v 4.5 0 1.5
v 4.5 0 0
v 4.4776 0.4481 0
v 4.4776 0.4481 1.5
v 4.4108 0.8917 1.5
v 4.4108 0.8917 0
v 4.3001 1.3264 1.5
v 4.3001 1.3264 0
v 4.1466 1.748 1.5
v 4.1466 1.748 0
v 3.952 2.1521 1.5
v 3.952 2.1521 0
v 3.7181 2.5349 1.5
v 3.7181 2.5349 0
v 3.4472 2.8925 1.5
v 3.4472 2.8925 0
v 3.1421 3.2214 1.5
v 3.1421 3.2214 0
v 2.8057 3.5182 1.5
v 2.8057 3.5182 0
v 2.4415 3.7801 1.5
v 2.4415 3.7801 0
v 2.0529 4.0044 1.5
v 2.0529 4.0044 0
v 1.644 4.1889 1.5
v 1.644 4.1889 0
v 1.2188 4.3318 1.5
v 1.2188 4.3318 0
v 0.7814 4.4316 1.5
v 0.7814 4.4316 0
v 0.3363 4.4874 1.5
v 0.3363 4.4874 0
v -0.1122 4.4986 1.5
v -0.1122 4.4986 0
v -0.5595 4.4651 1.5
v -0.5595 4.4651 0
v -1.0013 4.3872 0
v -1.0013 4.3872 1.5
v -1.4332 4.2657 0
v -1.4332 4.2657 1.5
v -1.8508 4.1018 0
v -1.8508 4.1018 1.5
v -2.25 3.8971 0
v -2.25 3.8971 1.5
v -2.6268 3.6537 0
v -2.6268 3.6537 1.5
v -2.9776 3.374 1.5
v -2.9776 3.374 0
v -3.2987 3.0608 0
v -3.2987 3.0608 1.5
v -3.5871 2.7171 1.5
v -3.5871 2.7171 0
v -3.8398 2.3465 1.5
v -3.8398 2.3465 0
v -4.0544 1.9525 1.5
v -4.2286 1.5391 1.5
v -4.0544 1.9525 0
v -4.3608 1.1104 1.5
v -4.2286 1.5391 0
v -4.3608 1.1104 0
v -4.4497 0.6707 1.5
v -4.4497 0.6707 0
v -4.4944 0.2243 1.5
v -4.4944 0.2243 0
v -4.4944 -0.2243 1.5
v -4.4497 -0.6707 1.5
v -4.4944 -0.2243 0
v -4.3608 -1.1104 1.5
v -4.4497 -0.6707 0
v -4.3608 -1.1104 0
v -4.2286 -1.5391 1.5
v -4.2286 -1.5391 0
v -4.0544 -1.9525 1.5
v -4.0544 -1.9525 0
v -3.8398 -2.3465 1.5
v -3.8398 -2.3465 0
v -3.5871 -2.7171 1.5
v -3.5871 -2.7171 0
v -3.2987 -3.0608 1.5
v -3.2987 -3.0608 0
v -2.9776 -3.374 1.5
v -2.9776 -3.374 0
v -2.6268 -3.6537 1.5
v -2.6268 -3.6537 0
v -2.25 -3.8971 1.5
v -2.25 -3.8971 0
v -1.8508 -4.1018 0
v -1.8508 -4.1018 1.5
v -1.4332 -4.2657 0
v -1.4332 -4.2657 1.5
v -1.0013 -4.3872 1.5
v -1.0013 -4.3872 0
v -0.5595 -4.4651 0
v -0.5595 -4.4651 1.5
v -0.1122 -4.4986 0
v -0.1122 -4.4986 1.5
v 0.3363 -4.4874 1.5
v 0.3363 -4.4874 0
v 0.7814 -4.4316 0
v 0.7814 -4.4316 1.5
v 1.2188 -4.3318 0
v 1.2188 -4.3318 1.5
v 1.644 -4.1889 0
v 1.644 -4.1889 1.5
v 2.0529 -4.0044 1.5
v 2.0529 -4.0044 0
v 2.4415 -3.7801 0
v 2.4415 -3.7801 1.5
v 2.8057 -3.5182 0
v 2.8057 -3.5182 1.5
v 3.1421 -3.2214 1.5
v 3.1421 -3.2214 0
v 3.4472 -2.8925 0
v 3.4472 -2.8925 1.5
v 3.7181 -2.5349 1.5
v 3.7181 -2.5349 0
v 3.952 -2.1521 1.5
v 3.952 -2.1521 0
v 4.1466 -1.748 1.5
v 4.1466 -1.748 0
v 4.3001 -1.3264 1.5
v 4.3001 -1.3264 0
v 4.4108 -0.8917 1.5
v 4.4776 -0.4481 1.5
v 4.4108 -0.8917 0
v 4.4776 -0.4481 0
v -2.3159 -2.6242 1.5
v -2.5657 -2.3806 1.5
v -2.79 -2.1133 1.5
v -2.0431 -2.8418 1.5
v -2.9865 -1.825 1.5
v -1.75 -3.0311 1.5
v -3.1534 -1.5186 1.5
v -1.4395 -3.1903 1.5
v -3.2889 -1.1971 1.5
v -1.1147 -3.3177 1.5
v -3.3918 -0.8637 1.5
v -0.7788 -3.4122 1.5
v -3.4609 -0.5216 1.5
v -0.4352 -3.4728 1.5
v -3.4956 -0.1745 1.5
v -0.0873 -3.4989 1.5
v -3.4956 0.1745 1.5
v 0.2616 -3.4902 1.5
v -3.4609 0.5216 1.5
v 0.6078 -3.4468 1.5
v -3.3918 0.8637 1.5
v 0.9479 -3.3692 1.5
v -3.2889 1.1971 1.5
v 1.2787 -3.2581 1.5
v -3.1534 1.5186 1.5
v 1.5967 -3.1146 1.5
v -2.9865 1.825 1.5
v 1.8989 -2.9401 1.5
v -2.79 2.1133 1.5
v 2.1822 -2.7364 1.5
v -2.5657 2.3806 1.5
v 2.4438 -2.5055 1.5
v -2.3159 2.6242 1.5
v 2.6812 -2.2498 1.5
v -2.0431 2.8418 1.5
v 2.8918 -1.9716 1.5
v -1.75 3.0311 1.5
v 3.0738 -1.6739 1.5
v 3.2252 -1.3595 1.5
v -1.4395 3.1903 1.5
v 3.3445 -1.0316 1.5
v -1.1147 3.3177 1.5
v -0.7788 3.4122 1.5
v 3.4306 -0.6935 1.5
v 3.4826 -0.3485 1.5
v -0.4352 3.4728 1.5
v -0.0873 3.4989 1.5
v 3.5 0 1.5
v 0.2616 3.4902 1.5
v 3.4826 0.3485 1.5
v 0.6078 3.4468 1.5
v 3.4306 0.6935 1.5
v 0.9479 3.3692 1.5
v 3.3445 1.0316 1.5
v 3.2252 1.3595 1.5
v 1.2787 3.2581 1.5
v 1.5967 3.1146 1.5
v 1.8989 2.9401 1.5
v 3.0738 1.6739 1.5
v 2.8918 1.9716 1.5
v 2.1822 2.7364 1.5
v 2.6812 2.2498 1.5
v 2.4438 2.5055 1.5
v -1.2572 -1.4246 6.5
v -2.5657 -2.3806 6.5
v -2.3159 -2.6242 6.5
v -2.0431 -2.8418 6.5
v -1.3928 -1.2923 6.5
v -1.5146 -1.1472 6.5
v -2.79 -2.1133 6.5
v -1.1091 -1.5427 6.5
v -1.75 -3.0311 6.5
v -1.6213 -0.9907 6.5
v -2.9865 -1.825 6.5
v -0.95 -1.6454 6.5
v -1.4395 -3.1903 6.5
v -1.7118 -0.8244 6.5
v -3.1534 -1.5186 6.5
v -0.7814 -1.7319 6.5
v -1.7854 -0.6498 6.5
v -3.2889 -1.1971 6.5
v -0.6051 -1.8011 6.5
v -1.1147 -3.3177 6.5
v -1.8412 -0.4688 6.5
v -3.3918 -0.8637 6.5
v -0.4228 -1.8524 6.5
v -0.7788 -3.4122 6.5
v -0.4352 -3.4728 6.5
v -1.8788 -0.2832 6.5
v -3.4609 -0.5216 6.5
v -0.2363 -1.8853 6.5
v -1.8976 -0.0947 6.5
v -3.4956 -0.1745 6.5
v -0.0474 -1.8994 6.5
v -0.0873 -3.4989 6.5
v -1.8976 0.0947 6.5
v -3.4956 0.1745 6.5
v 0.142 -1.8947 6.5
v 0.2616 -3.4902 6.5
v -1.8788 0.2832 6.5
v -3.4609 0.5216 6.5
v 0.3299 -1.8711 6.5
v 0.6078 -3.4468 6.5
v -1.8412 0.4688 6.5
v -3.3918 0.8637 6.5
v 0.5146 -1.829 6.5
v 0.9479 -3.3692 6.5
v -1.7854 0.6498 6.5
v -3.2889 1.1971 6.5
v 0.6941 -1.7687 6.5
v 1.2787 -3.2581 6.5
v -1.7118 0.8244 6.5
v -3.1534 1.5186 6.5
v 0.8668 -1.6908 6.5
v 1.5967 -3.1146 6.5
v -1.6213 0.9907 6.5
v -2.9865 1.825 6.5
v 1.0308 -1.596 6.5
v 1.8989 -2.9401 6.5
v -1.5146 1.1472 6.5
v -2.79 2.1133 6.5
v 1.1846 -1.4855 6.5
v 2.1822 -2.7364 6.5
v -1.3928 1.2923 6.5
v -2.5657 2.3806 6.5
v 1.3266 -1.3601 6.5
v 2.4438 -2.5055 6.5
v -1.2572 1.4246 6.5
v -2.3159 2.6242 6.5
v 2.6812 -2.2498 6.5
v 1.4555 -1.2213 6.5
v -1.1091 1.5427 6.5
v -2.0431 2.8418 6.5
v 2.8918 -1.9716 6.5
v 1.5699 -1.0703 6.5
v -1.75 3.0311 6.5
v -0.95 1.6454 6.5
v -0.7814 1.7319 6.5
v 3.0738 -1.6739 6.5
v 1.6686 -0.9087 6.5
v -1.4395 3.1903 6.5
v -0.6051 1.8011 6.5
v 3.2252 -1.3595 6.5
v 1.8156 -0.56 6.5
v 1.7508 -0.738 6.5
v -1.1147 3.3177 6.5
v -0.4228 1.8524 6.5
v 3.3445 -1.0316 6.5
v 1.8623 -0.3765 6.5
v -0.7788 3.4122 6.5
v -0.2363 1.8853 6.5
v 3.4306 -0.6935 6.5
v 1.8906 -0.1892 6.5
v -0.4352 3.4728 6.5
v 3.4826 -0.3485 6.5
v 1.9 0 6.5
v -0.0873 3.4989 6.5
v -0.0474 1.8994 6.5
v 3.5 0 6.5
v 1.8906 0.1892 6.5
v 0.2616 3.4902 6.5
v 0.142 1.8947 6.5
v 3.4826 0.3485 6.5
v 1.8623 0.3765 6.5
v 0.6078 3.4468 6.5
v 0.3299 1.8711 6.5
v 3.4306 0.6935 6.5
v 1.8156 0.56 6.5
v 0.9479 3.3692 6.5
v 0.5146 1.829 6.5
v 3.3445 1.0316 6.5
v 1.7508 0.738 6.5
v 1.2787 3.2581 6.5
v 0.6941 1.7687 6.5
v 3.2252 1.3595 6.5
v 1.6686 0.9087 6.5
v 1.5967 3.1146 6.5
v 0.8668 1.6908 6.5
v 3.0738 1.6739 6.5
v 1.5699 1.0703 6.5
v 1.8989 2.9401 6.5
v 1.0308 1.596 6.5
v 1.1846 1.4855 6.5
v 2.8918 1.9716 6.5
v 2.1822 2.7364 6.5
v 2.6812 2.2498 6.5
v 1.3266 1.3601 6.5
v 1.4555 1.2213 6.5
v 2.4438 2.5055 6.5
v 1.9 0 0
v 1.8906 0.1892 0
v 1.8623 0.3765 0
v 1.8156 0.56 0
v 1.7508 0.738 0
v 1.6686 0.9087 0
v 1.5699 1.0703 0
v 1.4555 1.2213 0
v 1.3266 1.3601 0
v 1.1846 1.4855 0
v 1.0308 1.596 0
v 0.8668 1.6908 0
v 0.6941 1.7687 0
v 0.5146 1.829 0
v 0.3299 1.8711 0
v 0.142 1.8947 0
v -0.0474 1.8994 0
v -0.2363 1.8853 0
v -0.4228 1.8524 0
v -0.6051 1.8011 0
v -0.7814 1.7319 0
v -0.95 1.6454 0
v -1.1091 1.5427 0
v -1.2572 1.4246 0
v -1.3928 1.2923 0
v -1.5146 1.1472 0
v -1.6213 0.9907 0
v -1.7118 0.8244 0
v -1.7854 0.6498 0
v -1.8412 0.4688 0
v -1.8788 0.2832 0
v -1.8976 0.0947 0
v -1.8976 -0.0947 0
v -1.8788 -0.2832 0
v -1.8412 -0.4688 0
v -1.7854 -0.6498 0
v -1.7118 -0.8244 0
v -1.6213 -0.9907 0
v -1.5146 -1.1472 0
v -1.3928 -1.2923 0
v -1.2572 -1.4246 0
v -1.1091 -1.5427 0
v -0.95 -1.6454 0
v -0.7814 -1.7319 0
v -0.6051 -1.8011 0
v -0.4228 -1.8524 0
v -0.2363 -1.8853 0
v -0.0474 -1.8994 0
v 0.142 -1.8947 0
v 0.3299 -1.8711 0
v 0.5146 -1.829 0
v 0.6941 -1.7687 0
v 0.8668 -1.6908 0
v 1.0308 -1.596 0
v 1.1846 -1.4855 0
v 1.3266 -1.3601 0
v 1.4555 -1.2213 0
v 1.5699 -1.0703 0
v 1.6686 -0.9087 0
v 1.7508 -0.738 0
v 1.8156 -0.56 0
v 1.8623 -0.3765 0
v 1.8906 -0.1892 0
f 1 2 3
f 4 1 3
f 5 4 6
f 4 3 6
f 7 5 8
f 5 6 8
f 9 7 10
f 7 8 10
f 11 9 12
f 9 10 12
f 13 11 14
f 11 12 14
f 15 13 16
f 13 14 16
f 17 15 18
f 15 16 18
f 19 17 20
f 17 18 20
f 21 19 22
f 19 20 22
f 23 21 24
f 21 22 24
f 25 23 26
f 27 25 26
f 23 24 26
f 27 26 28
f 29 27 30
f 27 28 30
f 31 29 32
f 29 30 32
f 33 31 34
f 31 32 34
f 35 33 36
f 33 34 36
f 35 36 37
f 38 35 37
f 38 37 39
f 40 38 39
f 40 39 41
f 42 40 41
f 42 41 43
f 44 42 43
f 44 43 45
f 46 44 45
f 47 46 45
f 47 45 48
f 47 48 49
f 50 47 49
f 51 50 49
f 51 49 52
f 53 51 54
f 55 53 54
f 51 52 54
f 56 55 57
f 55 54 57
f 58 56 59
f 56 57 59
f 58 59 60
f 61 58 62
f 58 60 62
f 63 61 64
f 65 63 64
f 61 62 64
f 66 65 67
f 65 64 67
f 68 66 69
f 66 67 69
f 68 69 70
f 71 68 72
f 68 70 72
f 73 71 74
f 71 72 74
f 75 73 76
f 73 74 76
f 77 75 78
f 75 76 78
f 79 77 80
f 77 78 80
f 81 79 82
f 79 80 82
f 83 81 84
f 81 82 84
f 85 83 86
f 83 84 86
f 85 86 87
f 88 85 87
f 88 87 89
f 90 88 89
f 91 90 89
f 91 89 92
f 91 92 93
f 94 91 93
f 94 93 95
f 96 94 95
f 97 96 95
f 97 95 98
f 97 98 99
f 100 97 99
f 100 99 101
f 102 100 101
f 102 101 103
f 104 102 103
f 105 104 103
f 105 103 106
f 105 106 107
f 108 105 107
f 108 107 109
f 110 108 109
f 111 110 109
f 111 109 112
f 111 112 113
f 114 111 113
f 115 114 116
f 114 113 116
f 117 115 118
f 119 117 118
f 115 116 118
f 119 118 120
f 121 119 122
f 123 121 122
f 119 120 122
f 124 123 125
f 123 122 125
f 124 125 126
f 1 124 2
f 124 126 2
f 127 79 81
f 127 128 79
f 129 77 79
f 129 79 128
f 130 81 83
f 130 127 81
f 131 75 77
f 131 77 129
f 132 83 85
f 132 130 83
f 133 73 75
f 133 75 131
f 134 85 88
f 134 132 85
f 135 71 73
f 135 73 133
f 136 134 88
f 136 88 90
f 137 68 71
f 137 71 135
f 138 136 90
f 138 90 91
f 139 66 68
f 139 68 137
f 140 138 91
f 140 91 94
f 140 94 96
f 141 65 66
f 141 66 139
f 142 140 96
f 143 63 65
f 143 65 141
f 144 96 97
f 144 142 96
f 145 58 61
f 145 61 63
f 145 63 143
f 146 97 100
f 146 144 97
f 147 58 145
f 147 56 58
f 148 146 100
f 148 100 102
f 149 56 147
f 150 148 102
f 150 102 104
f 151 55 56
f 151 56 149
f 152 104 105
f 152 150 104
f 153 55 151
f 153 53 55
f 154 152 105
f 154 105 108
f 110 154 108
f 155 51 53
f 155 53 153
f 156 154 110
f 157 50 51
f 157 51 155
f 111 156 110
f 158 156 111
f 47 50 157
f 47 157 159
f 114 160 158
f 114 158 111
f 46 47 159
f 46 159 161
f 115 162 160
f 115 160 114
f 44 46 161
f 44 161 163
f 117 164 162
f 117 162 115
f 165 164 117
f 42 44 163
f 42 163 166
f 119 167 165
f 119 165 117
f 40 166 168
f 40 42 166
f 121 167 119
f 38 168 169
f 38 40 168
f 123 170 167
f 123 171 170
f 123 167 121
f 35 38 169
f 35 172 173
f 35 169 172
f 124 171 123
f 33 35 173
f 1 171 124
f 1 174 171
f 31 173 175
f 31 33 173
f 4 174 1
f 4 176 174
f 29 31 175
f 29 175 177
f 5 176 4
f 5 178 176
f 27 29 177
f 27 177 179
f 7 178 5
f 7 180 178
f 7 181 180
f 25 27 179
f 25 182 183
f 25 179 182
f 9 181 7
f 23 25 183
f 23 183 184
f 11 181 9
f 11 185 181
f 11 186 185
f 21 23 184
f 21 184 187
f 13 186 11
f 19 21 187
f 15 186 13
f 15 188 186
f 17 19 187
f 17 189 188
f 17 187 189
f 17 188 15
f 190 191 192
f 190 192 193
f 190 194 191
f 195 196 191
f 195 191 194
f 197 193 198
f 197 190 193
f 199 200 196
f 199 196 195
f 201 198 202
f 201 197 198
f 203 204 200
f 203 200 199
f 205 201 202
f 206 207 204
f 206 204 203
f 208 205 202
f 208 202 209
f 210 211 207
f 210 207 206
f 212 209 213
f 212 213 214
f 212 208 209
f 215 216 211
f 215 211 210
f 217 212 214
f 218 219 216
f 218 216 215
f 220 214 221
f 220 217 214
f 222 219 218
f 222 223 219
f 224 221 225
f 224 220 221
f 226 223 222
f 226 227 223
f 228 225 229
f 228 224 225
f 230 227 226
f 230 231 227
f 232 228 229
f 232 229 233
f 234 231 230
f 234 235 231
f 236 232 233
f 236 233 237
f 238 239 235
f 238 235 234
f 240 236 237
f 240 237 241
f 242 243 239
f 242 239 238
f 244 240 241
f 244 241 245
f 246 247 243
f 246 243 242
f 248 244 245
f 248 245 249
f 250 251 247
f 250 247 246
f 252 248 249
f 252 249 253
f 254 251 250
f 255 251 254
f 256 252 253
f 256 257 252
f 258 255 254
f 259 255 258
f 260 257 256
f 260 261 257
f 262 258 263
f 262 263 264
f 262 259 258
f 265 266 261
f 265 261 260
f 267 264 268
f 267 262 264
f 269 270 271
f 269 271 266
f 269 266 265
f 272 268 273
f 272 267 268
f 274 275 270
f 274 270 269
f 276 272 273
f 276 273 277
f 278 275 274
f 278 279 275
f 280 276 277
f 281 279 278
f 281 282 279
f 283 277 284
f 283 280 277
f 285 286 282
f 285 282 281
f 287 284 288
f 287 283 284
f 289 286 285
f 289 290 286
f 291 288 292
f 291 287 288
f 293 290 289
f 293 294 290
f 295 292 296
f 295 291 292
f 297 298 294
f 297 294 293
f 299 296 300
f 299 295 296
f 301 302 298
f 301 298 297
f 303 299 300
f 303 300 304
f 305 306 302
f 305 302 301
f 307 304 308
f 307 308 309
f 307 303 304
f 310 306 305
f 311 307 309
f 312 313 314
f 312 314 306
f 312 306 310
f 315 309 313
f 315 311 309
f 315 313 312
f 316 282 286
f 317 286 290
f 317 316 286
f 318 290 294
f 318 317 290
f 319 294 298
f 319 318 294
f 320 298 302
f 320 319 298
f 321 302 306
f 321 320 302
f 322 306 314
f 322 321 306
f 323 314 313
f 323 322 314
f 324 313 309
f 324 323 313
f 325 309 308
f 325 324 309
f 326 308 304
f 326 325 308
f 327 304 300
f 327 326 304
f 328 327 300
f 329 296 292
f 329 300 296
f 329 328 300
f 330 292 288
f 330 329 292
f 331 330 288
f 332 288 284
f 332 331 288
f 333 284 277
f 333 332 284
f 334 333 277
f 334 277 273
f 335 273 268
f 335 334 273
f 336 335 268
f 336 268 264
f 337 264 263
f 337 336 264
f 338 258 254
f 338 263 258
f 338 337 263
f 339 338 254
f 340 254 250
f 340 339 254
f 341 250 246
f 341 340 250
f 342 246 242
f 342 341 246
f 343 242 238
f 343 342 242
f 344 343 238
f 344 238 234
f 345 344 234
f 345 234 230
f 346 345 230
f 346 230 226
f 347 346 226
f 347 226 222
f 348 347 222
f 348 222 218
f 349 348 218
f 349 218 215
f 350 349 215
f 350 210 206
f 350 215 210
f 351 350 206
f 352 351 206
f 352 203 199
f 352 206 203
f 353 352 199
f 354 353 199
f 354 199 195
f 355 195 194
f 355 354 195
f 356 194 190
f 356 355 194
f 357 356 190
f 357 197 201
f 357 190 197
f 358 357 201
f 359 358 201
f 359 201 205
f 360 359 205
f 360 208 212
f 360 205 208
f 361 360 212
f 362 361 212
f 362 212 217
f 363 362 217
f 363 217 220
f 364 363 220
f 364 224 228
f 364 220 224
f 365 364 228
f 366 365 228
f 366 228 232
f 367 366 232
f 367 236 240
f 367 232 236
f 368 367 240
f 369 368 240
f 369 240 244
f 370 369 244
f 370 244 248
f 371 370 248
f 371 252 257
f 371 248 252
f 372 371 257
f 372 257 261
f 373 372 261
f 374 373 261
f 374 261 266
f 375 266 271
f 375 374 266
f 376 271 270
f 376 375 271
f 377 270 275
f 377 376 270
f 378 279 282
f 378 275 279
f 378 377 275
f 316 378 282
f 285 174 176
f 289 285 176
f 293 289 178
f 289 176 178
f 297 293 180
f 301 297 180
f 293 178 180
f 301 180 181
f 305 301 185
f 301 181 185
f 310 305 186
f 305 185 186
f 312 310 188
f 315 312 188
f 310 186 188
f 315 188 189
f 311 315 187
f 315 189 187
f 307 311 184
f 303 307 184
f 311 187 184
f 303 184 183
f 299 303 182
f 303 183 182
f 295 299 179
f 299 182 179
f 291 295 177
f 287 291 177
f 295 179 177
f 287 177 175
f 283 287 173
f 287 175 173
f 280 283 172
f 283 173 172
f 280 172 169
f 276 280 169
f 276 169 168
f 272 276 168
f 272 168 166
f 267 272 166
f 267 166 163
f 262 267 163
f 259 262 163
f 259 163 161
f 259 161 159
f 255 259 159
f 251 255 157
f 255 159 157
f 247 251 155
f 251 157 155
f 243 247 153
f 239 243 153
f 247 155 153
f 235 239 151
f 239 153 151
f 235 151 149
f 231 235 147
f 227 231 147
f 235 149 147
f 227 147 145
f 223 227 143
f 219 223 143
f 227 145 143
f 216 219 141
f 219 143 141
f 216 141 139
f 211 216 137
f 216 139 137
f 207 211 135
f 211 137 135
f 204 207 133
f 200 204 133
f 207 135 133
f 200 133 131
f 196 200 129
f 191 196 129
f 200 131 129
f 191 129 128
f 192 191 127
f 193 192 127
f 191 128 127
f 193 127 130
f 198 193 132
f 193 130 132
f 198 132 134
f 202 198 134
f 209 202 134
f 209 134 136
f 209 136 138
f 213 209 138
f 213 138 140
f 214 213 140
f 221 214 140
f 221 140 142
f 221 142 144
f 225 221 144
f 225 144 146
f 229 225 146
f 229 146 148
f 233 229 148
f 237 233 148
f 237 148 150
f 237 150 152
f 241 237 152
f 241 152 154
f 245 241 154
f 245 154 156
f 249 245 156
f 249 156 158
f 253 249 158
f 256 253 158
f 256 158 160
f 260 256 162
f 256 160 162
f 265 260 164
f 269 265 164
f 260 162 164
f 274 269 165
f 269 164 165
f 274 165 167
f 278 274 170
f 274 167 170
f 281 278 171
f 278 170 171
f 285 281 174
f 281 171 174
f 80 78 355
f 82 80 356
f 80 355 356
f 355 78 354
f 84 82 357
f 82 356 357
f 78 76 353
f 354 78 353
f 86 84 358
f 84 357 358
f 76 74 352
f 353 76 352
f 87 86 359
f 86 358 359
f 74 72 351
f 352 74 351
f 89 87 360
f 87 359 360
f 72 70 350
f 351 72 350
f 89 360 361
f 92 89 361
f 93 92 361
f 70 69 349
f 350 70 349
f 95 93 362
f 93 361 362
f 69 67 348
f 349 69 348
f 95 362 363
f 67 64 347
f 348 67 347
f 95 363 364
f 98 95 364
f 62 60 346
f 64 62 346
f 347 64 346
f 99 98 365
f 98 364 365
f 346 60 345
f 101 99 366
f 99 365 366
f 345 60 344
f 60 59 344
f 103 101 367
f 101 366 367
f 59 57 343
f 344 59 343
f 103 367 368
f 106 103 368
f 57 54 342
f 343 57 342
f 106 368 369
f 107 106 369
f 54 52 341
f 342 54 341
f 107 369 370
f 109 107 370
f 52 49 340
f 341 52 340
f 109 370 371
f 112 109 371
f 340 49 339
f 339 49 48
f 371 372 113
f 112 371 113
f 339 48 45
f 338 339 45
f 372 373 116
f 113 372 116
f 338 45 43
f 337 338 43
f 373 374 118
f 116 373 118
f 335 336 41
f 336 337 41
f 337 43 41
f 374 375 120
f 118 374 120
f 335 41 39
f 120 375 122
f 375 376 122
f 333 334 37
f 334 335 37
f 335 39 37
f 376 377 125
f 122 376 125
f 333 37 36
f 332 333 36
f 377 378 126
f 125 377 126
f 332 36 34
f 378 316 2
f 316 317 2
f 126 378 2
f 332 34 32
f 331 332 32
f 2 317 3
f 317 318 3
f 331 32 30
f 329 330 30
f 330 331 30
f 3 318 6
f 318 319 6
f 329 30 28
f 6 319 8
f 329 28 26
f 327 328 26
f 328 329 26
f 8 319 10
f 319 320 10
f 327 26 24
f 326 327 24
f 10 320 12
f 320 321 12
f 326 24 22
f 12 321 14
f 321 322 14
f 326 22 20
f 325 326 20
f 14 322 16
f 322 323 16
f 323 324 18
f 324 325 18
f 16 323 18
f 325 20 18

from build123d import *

# Parameters (mm, degrees)
F0_R     = 4.5
F1_DEPTH = 1.5
F2_R     = 3.5
F3_DEPTH = 5
F4_R     = 1.9
F5_DEPTH = 25


with BuildPart() as f1:
    # F0 (on Top) → F1 (new body)
    with BuildSketch(Plane.XY):
        Circle(F0_R)
    extrude(amount=F1_DEPTH)

    # F2 (on face) → F3 (join)
    with BuildSketch(Plane.XY.offset(1.5)):
        Circle(F2_R)
    extrude(amount=F3_DEPTH)

    # F4 (on Top) → F5 (cut)
    with BuildSketch(Plane.XY):
        Circle(F4_R)
    extrude(amount=F5_DEPTH, mode=Mode.SUBTRACT)


solid = f1.part
